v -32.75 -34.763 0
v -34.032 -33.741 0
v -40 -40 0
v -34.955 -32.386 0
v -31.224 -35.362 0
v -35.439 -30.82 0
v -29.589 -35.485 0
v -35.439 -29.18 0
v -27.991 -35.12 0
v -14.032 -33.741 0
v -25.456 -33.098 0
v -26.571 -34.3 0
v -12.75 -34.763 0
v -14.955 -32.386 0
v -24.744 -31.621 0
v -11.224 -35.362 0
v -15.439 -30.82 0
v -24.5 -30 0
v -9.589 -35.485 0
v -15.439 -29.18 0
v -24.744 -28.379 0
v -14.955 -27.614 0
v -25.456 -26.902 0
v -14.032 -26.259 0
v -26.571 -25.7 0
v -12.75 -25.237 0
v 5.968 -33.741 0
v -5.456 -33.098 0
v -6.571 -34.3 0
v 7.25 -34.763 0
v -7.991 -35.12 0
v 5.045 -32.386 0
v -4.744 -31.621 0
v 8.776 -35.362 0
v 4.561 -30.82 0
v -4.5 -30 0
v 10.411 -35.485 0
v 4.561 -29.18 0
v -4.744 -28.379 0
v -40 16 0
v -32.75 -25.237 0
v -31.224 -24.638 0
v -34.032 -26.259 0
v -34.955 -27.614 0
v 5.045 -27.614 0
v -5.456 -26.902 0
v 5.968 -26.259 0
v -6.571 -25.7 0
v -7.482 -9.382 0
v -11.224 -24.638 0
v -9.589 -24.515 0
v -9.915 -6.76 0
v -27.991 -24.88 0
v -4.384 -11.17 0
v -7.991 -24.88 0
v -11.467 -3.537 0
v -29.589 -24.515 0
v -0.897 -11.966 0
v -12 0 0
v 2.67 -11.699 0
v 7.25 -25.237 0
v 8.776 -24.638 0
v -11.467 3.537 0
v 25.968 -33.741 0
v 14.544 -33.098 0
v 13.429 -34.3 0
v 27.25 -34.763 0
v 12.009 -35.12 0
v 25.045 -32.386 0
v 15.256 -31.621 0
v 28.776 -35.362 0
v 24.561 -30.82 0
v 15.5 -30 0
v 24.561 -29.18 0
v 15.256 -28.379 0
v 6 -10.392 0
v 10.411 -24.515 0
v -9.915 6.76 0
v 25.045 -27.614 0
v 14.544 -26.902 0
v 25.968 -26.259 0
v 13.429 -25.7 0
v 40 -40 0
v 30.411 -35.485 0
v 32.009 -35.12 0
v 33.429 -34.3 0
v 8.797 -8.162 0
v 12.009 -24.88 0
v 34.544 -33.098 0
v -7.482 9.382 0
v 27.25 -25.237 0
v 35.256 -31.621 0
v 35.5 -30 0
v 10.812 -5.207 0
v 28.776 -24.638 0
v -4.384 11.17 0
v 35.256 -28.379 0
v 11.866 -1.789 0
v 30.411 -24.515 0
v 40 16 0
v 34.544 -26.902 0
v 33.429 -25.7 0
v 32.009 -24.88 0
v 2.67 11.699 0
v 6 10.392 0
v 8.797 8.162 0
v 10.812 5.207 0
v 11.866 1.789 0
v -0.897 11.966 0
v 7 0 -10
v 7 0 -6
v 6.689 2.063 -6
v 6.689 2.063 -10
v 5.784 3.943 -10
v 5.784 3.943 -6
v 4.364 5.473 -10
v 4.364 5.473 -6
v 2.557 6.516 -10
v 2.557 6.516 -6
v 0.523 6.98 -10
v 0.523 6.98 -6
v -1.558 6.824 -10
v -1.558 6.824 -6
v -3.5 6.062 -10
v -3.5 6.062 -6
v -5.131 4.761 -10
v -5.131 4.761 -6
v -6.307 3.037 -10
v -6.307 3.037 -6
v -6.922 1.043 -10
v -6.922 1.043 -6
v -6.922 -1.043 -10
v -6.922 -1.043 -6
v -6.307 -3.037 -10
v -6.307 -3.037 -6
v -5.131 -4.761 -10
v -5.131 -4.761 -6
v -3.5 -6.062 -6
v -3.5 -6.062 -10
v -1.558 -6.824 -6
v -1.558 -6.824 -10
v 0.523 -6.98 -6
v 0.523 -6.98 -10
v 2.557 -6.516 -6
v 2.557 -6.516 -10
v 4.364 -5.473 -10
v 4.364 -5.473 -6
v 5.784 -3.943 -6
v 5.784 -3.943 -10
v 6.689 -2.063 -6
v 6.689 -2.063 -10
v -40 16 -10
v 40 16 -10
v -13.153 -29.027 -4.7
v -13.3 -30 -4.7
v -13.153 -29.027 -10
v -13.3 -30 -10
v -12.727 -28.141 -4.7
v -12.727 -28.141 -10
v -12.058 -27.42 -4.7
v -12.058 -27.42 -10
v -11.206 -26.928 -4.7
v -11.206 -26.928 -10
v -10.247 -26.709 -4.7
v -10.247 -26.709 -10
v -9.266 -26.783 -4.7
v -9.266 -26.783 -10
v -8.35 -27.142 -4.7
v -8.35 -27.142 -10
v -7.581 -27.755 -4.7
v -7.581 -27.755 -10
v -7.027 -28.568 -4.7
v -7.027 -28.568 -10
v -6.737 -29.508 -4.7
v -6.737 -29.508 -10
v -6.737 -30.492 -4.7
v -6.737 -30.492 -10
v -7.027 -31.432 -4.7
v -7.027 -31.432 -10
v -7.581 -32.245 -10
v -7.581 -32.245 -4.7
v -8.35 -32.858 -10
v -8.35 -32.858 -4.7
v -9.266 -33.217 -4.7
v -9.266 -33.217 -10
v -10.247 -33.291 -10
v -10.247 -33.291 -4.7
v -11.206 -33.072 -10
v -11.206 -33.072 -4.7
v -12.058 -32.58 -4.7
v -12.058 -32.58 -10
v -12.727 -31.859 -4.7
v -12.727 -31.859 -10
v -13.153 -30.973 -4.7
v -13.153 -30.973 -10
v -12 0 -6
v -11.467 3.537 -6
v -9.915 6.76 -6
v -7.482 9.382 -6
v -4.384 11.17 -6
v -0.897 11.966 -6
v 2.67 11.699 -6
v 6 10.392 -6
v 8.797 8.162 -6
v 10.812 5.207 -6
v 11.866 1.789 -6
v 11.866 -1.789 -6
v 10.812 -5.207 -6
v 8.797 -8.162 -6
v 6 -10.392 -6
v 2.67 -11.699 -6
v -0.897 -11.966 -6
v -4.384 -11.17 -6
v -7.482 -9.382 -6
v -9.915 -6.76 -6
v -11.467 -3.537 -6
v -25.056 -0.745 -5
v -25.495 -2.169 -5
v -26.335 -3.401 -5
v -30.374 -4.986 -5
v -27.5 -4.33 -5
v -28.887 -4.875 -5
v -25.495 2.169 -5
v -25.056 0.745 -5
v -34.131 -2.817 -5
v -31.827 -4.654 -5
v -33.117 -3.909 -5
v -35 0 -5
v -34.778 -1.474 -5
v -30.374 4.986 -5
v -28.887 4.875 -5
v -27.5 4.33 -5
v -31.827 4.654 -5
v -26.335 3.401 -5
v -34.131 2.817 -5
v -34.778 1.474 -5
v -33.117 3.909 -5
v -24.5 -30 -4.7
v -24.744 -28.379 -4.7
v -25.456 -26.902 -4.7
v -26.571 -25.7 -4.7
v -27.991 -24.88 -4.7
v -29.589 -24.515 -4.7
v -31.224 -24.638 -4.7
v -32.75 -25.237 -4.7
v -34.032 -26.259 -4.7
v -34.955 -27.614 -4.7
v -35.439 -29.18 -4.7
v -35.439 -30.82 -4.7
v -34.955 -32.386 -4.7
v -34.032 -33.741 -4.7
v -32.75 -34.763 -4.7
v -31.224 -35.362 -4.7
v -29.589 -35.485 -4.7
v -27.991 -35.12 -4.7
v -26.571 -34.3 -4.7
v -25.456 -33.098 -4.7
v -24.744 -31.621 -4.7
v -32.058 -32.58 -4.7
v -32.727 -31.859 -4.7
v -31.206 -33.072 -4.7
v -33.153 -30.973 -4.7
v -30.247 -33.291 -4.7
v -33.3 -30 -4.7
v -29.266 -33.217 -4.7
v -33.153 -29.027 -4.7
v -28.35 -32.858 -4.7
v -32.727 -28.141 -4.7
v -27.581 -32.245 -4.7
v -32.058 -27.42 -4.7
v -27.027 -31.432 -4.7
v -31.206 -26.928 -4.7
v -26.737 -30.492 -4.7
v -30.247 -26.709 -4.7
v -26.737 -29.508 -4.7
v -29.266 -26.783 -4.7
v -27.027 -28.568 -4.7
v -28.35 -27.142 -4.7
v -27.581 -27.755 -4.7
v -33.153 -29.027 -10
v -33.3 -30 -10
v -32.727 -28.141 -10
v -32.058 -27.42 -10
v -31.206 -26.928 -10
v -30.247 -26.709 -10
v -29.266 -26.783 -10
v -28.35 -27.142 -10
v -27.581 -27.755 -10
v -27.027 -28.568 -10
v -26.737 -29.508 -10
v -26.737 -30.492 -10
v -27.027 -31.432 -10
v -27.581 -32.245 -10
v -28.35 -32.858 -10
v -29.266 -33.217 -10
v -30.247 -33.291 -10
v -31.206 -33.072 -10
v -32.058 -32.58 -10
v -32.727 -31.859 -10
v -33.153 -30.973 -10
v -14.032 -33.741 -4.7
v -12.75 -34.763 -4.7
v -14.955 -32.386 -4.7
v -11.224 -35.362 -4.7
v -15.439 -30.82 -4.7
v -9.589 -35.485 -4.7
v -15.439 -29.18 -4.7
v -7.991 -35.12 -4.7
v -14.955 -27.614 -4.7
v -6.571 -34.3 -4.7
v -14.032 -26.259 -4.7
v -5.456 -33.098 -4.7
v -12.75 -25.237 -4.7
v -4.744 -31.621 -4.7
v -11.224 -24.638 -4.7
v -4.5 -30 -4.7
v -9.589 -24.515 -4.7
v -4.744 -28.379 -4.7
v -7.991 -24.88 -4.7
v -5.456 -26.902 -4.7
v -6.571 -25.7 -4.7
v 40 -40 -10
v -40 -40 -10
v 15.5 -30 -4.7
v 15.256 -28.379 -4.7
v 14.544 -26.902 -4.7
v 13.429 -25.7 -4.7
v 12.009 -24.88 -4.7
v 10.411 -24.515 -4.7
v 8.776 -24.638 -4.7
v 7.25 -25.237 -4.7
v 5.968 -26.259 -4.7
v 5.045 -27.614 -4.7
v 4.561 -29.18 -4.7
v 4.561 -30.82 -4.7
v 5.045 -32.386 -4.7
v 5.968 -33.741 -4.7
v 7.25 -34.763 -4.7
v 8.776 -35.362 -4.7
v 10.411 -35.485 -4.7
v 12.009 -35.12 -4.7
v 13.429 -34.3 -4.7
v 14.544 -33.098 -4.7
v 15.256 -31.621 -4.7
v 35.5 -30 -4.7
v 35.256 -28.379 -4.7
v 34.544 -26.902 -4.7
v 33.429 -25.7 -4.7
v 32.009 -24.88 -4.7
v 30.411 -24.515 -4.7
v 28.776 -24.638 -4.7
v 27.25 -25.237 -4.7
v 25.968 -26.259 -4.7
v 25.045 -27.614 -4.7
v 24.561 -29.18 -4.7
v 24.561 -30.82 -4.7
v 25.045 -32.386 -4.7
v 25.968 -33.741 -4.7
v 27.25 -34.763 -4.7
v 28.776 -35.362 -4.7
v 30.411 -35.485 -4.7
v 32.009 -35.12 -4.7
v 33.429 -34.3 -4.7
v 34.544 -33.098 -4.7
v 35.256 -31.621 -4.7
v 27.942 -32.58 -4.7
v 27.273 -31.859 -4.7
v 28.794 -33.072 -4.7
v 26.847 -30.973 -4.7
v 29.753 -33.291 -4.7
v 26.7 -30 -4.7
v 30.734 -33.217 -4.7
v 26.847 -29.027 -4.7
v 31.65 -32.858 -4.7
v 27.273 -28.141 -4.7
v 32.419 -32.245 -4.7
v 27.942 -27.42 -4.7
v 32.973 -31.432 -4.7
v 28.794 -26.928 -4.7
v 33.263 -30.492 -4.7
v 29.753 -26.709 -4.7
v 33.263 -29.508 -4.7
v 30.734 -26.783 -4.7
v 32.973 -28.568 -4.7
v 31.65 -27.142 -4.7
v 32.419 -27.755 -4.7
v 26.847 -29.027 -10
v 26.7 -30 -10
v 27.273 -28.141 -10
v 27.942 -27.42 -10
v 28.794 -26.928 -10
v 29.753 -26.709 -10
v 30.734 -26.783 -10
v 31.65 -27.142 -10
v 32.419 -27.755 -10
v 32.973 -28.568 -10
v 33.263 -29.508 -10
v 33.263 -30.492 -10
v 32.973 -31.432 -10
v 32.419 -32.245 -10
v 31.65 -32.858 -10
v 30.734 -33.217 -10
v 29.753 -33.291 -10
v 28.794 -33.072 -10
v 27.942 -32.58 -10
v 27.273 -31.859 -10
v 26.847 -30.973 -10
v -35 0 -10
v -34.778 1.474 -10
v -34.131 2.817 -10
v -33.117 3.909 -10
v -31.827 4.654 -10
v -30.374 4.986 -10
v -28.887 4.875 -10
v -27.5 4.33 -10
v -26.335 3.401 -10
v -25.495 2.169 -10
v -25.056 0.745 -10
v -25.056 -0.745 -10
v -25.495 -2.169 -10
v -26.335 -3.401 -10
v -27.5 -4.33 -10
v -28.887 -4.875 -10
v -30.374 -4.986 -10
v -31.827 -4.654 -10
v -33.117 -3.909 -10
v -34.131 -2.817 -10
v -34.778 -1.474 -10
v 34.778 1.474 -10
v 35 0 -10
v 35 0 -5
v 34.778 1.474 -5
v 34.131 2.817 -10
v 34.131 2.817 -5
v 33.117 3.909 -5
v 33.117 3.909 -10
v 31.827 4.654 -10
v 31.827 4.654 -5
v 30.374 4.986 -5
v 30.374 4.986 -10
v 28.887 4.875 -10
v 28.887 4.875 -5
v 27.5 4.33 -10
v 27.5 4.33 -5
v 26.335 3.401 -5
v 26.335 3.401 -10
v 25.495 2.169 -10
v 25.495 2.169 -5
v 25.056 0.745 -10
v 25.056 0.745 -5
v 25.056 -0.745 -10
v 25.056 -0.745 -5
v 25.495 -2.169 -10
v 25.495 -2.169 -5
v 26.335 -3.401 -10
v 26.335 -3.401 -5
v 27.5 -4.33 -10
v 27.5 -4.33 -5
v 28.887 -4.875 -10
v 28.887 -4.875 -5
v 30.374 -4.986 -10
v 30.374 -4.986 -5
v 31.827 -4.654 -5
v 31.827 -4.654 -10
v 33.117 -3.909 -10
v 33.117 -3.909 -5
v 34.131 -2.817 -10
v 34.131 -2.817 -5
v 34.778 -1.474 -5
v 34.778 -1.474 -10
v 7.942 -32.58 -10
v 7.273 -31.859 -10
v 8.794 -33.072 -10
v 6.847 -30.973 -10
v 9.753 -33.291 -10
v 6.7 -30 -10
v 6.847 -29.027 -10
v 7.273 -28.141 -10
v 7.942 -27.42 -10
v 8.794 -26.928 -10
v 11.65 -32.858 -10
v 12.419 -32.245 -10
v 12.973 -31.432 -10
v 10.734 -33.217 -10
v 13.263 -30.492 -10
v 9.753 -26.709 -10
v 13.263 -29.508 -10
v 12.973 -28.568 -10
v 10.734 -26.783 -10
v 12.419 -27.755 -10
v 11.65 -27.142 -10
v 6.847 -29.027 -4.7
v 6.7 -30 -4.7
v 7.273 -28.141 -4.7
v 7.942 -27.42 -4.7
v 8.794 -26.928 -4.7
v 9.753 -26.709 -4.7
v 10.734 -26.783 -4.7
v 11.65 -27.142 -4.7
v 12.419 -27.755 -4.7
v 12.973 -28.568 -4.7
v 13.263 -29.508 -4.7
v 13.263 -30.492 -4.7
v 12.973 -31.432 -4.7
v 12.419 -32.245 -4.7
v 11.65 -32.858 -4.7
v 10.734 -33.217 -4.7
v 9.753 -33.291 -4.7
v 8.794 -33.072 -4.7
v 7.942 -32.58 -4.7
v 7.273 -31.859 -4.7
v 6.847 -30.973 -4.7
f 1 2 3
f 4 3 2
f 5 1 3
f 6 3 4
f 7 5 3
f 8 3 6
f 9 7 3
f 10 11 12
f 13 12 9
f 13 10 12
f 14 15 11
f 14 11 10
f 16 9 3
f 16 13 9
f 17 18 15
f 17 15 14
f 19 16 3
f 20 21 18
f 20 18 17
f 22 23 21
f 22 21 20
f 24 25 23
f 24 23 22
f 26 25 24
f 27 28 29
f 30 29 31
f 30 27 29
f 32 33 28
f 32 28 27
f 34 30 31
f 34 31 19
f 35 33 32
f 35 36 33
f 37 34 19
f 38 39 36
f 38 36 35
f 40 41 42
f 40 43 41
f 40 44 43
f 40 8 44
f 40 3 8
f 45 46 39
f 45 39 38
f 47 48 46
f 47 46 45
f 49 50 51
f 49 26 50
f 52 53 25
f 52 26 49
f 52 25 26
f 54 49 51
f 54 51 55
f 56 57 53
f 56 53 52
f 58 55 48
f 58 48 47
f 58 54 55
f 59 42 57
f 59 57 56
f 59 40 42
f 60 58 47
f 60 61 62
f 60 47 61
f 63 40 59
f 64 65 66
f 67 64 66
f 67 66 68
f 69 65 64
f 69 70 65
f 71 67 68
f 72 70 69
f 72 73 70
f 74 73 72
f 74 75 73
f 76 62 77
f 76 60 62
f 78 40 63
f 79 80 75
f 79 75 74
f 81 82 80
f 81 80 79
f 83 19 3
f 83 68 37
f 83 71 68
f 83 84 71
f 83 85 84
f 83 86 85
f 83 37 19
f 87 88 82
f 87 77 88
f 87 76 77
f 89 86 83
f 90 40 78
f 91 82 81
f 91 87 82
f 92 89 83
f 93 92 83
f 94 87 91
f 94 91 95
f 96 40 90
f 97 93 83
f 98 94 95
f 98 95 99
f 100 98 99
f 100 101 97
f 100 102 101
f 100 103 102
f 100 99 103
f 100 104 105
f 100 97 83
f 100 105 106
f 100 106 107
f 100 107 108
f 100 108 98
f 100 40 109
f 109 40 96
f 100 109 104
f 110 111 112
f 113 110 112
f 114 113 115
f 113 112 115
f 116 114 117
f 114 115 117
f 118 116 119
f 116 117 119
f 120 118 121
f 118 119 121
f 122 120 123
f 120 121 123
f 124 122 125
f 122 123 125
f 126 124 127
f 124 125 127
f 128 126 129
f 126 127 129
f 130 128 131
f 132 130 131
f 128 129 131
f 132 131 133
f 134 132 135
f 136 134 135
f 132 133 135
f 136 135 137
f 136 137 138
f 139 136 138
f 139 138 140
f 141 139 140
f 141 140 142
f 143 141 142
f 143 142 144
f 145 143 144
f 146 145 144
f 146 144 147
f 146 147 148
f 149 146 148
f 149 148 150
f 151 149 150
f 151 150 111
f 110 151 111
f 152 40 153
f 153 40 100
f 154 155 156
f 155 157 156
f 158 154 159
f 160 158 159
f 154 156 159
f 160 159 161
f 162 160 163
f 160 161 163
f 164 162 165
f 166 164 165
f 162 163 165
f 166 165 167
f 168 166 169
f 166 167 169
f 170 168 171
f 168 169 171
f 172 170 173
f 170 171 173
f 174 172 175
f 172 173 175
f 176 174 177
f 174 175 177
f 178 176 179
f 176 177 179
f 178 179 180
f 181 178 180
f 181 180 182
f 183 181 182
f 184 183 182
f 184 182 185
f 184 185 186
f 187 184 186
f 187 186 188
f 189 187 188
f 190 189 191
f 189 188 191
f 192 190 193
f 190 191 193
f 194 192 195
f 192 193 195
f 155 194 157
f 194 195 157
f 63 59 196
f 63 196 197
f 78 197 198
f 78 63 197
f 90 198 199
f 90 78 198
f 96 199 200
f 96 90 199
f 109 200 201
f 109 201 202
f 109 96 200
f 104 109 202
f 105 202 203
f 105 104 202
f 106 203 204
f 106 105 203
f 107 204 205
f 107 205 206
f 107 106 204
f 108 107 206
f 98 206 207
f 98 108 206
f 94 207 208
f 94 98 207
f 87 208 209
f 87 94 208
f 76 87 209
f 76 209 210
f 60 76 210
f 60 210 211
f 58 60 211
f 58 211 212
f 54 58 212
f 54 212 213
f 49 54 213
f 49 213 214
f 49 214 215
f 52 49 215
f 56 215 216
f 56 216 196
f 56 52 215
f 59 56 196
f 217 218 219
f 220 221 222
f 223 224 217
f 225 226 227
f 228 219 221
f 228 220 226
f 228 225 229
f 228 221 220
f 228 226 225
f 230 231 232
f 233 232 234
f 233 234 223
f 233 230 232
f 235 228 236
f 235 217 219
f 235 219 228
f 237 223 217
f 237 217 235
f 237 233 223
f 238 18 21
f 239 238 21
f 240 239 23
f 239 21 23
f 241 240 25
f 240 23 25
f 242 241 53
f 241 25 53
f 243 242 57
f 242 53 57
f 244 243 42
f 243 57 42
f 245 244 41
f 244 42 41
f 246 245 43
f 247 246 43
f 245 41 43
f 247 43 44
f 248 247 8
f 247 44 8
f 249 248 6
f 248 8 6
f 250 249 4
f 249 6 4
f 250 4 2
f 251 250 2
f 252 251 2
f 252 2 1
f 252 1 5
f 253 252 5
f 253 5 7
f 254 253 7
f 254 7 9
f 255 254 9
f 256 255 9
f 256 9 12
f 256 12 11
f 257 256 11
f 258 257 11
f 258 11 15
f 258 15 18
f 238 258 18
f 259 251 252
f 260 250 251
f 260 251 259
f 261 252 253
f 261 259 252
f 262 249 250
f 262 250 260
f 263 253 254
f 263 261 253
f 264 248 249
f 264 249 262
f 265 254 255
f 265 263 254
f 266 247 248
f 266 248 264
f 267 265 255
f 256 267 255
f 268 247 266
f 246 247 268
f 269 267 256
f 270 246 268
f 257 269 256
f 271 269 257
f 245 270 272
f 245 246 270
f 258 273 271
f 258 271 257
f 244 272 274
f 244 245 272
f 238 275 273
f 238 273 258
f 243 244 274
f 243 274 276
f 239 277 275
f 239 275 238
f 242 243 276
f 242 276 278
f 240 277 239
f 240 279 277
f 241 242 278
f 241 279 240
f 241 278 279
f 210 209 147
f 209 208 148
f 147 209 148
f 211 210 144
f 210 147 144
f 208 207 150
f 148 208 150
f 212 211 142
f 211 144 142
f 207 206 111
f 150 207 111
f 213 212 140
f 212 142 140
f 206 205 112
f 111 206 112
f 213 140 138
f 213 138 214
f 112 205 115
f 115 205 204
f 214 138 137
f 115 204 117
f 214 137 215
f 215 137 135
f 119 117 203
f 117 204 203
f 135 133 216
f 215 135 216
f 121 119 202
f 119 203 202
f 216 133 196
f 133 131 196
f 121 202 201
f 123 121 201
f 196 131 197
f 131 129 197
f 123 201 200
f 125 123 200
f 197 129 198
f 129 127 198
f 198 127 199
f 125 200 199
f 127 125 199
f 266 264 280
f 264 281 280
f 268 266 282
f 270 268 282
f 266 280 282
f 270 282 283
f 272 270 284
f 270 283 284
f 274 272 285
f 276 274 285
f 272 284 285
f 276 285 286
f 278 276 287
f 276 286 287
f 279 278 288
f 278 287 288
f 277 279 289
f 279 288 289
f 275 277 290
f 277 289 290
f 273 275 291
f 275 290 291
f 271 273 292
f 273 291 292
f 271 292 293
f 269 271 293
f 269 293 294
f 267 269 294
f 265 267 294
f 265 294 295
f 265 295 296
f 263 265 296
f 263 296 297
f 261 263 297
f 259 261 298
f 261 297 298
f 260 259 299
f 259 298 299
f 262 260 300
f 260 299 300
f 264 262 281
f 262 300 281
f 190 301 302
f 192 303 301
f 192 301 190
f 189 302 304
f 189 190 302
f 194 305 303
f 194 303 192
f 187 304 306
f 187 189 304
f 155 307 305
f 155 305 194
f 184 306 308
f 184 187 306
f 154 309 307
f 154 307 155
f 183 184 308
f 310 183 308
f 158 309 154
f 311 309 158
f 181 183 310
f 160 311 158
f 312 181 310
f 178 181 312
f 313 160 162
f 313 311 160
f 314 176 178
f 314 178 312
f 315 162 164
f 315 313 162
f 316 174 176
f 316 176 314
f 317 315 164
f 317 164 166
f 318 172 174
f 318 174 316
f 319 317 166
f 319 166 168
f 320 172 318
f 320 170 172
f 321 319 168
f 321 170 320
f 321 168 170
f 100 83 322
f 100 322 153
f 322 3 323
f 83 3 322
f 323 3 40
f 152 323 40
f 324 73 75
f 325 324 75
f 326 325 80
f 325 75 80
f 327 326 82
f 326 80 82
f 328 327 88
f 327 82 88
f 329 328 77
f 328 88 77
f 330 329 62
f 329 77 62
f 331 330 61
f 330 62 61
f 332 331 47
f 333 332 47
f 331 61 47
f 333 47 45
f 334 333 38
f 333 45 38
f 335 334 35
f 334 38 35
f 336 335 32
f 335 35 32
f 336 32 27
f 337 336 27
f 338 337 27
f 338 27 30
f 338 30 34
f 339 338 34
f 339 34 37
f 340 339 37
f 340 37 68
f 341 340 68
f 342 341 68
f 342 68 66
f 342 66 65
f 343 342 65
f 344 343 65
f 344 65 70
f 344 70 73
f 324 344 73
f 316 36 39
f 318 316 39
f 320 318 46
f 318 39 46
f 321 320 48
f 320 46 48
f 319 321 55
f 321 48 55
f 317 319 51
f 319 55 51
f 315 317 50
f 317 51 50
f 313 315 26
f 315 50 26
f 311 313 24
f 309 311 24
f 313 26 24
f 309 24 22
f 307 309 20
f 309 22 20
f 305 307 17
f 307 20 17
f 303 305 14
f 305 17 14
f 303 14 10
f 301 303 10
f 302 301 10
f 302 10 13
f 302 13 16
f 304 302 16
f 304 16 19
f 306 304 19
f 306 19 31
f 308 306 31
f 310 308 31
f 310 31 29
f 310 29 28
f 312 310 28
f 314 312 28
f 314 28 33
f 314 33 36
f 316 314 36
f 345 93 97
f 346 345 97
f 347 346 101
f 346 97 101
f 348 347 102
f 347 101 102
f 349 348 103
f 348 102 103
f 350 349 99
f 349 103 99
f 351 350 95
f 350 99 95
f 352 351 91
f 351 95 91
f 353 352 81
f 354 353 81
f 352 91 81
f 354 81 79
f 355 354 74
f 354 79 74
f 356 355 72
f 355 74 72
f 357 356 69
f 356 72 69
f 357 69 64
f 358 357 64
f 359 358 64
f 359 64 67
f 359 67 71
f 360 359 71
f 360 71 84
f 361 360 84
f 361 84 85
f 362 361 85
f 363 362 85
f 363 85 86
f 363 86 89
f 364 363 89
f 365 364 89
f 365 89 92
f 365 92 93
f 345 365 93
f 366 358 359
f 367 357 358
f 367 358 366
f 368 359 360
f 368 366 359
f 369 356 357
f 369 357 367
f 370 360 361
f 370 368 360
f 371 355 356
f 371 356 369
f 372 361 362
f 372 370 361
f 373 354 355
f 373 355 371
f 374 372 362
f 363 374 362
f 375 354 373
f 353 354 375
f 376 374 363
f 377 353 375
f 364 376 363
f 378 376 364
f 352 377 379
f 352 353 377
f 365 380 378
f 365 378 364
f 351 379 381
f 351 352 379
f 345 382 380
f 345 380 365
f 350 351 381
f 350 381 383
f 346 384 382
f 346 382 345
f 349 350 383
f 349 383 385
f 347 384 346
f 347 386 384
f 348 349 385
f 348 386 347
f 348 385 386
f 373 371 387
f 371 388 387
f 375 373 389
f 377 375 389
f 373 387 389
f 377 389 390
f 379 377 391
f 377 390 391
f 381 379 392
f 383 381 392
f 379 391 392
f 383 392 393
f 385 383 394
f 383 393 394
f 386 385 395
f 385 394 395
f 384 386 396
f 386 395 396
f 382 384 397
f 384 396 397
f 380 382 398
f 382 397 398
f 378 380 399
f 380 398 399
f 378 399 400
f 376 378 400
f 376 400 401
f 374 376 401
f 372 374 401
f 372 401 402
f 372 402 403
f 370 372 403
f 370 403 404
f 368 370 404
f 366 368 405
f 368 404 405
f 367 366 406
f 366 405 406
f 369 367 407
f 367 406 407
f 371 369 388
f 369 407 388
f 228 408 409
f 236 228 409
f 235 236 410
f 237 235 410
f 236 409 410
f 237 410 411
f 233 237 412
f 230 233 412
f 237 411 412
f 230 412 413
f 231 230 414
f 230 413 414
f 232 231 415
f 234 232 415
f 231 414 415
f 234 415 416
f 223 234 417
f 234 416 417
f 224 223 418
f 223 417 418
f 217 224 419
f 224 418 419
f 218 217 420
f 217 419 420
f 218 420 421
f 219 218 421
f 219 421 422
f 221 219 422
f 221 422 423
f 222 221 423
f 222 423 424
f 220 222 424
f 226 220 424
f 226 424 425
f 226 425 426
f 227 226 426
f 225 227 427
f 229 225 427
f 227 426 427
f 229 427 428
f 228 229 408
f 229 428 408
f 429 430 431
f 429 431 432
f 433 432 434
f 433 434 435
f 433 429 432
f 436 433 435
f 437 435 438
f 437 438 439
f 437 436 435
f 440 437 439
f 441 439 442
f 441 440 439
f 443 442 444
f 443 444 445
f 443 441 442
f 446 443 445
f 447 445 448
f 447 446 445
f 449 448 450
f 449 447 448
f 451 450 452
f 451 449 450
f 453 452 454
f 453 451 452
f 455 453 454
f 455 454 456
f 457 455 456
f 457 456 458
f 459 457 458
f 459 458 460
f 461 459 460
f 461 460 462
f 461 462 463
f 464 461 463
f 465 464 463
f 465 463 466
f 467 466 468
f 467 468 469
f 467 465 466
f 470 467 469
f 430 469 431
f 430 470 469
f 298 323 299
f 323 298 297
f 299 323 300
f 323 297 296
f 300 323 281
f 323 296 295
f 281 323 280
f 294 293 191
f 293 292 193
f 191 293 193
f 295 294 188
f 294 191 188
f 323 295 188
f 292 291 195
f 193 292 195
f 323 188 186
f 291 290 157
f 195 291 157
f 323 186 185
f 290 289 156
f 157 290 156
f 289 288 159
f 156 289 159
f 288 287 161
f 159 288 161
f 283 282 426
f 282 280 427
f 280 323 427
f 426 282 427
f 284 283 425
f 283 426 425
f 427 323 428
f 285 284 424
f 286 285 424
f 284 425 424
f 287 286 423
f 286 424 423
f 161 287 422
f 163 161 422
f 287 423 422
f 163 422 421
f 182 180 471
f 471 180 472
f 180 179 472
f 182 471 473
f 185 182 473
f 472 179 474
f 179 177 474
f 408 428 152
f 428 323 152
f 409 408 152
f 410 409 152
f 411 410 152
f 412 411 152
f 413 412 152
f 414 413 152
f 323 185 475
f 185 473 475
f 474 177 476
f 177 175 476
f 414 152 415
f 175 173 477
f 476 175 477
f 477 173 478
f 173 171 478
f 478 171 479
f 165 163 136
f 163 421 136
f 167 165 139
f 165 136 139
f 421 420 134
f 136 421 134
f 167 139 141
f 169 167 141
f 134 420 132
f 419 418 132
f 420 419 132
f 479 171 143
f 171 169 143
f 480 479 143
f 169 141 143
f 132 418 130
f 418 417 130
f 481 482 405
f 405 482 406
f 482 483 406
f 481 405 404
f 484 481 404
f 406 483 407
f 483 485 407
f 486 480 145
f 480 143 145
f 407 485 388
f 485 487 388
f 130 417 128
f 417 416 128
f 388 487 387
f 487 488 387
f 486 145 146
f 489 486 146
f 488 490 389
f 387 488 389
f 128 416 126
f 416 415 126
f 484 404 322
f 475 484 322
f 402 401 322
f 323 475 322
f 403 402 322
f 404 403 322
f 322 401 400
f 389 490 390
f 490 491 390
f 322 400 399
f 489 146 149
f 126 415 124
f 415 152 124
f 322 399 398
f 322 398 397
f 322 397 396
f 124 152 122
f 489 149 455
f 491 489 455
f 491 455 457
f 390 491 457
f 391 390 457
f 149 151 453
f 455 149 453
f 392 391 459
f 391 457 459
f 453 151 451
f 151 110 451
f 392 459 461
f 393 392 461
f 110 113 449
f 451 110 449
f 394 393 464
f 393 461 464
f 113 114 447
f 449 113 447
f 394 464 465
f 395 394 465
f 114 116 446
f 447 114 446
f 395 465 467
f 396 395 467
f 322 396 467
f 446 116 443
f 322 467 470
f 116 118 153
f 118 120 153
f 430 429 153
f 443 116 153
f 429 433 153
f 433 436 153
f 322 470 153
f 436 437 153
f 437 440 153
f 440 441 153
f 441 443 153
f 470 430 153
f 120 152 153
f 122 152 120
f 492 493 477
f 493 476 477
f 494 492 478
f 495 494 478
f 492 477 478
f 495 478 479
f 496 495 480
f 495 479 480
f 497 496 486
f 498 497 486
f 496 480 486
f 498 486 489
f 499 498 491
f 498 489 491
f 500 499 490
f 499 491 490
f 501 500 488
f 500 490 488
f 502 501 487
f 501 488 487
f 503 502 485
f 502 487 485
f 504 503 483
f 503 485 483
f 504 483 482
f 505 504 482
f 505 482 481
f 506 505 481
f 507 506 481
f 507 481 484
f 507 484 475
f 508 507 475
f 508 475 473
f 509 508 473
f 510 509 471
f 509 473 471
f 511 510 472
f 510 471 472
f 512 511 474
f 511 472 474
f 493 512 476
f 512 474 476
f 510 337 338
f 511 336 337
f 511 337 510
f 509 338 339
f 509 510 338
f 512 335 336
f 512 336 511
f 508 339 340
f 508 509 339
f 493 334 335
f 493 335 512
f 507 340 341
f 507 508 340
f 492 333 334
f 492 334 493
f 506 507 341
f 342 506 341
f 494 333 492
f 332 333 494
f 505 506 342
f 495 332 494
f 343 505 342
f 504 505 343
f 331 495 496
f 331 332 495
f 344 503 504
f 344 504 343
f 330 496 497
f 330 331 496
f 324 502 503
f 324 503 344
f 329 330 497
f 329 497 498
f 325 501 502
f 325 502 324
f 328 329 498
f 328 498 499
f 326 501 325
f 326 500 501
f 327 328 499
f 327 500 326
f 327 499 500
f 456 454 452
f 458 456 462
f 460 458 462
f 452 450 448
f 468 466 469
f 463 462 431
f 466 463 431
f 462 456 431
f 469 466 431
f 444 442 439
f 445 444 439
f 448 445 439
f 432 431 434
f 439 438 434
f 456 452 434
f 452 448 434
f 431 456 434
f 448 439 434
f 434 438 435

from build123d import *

# Parameters (mm, degrees)
SKETCH_1_W                   = 80
SKETCH_1_H                   = 56
EXTRUDE_1_DEPTH              = 10
HOLE_WIZARD_M6_1_D           = 6.6
HOLE_WIZARD_M6_1_CBORE_D     = 11
HOLE_WIZARD_M6_1_CBORE_DEPTH = 4.7
SKETCH_5_R                   = 7
CUT_EXTRUDE_1_DEPTH          = 10
SKETCH_6_R                   = 12
CUT_EXTRUDE_2_DEPTH          = 6
SKETCH_7_R                   = 5
CUT_EXTRUDE_3_DEPTH          = 5


with BuildPart() as part:
    # 草图1 → 凸台-拉伸1 (new body)
    with BuildSketch(Plane.XY):
        with Locations((0, -12)):
            Rectangle(SKETCH_1_W, SKETCH_1_H)
    extrude(amount=-EXTRUDE_1_DEPTH)

    # M6 内六角花型圆柱头螺钉的柱形沉头孔1 (through all)
    with Locations(Plane.XY):
        with Locations((30, -30), (-30, -30), (10, -30), (-10, -30)):
            CounterBoreHole(HOLE_WIZARD_M6_1_D / 2, HOLE_WIZARD_M6_1_CBORE_D / 2, HOLE_WIZARD_M6_1_CBORE_DEPTH)

    # 草图5 → 切除-拉伸1 (cut)
    with BuildSketch(Plane.XY):
        Circle(SKETCH_5_R)
    extrude(amount=-CUT_EXTRUDE_1_DEPTH, mode=Mode.SUBTRACT)

    # 草图6 → 切除-拉伸2 (cut)
    with BuildSketch(Plane(origin=(0, 0, 0), x_dir=(-1, 0, 0), z_dir=(0, 0, -1))):
        Circle(SKETCH_6_R)
    extrude(amount=CUT_EXTRUDE_2_DEPTH, mode=Mode.SUBTRACT)

    # 草图7 → 切除-拉伸3 (cut)
    with BuildSketch(Plane(origin=(0, 0, -10), x_dir=(-1, 0, 0), z_dir=(0, 0, -1))):
        with Locations((30, 0)):
            Circle(SKETCH_7_R)
    cut_extrude_3 = extrude(amount=-CUT_EXTRUDE_3_DEPTH, mode=Mode.SUBTRACT)

    # 镜向1: 切除-拉伸3 across plane
    add(cut_extrude_3.mirror(Plane(origin=(0, 0, 0), x_dir=(0, 0, 1), z_dir=(1, 0, 0))), mode=Mode.SUBTRACT)


solid = part.part
